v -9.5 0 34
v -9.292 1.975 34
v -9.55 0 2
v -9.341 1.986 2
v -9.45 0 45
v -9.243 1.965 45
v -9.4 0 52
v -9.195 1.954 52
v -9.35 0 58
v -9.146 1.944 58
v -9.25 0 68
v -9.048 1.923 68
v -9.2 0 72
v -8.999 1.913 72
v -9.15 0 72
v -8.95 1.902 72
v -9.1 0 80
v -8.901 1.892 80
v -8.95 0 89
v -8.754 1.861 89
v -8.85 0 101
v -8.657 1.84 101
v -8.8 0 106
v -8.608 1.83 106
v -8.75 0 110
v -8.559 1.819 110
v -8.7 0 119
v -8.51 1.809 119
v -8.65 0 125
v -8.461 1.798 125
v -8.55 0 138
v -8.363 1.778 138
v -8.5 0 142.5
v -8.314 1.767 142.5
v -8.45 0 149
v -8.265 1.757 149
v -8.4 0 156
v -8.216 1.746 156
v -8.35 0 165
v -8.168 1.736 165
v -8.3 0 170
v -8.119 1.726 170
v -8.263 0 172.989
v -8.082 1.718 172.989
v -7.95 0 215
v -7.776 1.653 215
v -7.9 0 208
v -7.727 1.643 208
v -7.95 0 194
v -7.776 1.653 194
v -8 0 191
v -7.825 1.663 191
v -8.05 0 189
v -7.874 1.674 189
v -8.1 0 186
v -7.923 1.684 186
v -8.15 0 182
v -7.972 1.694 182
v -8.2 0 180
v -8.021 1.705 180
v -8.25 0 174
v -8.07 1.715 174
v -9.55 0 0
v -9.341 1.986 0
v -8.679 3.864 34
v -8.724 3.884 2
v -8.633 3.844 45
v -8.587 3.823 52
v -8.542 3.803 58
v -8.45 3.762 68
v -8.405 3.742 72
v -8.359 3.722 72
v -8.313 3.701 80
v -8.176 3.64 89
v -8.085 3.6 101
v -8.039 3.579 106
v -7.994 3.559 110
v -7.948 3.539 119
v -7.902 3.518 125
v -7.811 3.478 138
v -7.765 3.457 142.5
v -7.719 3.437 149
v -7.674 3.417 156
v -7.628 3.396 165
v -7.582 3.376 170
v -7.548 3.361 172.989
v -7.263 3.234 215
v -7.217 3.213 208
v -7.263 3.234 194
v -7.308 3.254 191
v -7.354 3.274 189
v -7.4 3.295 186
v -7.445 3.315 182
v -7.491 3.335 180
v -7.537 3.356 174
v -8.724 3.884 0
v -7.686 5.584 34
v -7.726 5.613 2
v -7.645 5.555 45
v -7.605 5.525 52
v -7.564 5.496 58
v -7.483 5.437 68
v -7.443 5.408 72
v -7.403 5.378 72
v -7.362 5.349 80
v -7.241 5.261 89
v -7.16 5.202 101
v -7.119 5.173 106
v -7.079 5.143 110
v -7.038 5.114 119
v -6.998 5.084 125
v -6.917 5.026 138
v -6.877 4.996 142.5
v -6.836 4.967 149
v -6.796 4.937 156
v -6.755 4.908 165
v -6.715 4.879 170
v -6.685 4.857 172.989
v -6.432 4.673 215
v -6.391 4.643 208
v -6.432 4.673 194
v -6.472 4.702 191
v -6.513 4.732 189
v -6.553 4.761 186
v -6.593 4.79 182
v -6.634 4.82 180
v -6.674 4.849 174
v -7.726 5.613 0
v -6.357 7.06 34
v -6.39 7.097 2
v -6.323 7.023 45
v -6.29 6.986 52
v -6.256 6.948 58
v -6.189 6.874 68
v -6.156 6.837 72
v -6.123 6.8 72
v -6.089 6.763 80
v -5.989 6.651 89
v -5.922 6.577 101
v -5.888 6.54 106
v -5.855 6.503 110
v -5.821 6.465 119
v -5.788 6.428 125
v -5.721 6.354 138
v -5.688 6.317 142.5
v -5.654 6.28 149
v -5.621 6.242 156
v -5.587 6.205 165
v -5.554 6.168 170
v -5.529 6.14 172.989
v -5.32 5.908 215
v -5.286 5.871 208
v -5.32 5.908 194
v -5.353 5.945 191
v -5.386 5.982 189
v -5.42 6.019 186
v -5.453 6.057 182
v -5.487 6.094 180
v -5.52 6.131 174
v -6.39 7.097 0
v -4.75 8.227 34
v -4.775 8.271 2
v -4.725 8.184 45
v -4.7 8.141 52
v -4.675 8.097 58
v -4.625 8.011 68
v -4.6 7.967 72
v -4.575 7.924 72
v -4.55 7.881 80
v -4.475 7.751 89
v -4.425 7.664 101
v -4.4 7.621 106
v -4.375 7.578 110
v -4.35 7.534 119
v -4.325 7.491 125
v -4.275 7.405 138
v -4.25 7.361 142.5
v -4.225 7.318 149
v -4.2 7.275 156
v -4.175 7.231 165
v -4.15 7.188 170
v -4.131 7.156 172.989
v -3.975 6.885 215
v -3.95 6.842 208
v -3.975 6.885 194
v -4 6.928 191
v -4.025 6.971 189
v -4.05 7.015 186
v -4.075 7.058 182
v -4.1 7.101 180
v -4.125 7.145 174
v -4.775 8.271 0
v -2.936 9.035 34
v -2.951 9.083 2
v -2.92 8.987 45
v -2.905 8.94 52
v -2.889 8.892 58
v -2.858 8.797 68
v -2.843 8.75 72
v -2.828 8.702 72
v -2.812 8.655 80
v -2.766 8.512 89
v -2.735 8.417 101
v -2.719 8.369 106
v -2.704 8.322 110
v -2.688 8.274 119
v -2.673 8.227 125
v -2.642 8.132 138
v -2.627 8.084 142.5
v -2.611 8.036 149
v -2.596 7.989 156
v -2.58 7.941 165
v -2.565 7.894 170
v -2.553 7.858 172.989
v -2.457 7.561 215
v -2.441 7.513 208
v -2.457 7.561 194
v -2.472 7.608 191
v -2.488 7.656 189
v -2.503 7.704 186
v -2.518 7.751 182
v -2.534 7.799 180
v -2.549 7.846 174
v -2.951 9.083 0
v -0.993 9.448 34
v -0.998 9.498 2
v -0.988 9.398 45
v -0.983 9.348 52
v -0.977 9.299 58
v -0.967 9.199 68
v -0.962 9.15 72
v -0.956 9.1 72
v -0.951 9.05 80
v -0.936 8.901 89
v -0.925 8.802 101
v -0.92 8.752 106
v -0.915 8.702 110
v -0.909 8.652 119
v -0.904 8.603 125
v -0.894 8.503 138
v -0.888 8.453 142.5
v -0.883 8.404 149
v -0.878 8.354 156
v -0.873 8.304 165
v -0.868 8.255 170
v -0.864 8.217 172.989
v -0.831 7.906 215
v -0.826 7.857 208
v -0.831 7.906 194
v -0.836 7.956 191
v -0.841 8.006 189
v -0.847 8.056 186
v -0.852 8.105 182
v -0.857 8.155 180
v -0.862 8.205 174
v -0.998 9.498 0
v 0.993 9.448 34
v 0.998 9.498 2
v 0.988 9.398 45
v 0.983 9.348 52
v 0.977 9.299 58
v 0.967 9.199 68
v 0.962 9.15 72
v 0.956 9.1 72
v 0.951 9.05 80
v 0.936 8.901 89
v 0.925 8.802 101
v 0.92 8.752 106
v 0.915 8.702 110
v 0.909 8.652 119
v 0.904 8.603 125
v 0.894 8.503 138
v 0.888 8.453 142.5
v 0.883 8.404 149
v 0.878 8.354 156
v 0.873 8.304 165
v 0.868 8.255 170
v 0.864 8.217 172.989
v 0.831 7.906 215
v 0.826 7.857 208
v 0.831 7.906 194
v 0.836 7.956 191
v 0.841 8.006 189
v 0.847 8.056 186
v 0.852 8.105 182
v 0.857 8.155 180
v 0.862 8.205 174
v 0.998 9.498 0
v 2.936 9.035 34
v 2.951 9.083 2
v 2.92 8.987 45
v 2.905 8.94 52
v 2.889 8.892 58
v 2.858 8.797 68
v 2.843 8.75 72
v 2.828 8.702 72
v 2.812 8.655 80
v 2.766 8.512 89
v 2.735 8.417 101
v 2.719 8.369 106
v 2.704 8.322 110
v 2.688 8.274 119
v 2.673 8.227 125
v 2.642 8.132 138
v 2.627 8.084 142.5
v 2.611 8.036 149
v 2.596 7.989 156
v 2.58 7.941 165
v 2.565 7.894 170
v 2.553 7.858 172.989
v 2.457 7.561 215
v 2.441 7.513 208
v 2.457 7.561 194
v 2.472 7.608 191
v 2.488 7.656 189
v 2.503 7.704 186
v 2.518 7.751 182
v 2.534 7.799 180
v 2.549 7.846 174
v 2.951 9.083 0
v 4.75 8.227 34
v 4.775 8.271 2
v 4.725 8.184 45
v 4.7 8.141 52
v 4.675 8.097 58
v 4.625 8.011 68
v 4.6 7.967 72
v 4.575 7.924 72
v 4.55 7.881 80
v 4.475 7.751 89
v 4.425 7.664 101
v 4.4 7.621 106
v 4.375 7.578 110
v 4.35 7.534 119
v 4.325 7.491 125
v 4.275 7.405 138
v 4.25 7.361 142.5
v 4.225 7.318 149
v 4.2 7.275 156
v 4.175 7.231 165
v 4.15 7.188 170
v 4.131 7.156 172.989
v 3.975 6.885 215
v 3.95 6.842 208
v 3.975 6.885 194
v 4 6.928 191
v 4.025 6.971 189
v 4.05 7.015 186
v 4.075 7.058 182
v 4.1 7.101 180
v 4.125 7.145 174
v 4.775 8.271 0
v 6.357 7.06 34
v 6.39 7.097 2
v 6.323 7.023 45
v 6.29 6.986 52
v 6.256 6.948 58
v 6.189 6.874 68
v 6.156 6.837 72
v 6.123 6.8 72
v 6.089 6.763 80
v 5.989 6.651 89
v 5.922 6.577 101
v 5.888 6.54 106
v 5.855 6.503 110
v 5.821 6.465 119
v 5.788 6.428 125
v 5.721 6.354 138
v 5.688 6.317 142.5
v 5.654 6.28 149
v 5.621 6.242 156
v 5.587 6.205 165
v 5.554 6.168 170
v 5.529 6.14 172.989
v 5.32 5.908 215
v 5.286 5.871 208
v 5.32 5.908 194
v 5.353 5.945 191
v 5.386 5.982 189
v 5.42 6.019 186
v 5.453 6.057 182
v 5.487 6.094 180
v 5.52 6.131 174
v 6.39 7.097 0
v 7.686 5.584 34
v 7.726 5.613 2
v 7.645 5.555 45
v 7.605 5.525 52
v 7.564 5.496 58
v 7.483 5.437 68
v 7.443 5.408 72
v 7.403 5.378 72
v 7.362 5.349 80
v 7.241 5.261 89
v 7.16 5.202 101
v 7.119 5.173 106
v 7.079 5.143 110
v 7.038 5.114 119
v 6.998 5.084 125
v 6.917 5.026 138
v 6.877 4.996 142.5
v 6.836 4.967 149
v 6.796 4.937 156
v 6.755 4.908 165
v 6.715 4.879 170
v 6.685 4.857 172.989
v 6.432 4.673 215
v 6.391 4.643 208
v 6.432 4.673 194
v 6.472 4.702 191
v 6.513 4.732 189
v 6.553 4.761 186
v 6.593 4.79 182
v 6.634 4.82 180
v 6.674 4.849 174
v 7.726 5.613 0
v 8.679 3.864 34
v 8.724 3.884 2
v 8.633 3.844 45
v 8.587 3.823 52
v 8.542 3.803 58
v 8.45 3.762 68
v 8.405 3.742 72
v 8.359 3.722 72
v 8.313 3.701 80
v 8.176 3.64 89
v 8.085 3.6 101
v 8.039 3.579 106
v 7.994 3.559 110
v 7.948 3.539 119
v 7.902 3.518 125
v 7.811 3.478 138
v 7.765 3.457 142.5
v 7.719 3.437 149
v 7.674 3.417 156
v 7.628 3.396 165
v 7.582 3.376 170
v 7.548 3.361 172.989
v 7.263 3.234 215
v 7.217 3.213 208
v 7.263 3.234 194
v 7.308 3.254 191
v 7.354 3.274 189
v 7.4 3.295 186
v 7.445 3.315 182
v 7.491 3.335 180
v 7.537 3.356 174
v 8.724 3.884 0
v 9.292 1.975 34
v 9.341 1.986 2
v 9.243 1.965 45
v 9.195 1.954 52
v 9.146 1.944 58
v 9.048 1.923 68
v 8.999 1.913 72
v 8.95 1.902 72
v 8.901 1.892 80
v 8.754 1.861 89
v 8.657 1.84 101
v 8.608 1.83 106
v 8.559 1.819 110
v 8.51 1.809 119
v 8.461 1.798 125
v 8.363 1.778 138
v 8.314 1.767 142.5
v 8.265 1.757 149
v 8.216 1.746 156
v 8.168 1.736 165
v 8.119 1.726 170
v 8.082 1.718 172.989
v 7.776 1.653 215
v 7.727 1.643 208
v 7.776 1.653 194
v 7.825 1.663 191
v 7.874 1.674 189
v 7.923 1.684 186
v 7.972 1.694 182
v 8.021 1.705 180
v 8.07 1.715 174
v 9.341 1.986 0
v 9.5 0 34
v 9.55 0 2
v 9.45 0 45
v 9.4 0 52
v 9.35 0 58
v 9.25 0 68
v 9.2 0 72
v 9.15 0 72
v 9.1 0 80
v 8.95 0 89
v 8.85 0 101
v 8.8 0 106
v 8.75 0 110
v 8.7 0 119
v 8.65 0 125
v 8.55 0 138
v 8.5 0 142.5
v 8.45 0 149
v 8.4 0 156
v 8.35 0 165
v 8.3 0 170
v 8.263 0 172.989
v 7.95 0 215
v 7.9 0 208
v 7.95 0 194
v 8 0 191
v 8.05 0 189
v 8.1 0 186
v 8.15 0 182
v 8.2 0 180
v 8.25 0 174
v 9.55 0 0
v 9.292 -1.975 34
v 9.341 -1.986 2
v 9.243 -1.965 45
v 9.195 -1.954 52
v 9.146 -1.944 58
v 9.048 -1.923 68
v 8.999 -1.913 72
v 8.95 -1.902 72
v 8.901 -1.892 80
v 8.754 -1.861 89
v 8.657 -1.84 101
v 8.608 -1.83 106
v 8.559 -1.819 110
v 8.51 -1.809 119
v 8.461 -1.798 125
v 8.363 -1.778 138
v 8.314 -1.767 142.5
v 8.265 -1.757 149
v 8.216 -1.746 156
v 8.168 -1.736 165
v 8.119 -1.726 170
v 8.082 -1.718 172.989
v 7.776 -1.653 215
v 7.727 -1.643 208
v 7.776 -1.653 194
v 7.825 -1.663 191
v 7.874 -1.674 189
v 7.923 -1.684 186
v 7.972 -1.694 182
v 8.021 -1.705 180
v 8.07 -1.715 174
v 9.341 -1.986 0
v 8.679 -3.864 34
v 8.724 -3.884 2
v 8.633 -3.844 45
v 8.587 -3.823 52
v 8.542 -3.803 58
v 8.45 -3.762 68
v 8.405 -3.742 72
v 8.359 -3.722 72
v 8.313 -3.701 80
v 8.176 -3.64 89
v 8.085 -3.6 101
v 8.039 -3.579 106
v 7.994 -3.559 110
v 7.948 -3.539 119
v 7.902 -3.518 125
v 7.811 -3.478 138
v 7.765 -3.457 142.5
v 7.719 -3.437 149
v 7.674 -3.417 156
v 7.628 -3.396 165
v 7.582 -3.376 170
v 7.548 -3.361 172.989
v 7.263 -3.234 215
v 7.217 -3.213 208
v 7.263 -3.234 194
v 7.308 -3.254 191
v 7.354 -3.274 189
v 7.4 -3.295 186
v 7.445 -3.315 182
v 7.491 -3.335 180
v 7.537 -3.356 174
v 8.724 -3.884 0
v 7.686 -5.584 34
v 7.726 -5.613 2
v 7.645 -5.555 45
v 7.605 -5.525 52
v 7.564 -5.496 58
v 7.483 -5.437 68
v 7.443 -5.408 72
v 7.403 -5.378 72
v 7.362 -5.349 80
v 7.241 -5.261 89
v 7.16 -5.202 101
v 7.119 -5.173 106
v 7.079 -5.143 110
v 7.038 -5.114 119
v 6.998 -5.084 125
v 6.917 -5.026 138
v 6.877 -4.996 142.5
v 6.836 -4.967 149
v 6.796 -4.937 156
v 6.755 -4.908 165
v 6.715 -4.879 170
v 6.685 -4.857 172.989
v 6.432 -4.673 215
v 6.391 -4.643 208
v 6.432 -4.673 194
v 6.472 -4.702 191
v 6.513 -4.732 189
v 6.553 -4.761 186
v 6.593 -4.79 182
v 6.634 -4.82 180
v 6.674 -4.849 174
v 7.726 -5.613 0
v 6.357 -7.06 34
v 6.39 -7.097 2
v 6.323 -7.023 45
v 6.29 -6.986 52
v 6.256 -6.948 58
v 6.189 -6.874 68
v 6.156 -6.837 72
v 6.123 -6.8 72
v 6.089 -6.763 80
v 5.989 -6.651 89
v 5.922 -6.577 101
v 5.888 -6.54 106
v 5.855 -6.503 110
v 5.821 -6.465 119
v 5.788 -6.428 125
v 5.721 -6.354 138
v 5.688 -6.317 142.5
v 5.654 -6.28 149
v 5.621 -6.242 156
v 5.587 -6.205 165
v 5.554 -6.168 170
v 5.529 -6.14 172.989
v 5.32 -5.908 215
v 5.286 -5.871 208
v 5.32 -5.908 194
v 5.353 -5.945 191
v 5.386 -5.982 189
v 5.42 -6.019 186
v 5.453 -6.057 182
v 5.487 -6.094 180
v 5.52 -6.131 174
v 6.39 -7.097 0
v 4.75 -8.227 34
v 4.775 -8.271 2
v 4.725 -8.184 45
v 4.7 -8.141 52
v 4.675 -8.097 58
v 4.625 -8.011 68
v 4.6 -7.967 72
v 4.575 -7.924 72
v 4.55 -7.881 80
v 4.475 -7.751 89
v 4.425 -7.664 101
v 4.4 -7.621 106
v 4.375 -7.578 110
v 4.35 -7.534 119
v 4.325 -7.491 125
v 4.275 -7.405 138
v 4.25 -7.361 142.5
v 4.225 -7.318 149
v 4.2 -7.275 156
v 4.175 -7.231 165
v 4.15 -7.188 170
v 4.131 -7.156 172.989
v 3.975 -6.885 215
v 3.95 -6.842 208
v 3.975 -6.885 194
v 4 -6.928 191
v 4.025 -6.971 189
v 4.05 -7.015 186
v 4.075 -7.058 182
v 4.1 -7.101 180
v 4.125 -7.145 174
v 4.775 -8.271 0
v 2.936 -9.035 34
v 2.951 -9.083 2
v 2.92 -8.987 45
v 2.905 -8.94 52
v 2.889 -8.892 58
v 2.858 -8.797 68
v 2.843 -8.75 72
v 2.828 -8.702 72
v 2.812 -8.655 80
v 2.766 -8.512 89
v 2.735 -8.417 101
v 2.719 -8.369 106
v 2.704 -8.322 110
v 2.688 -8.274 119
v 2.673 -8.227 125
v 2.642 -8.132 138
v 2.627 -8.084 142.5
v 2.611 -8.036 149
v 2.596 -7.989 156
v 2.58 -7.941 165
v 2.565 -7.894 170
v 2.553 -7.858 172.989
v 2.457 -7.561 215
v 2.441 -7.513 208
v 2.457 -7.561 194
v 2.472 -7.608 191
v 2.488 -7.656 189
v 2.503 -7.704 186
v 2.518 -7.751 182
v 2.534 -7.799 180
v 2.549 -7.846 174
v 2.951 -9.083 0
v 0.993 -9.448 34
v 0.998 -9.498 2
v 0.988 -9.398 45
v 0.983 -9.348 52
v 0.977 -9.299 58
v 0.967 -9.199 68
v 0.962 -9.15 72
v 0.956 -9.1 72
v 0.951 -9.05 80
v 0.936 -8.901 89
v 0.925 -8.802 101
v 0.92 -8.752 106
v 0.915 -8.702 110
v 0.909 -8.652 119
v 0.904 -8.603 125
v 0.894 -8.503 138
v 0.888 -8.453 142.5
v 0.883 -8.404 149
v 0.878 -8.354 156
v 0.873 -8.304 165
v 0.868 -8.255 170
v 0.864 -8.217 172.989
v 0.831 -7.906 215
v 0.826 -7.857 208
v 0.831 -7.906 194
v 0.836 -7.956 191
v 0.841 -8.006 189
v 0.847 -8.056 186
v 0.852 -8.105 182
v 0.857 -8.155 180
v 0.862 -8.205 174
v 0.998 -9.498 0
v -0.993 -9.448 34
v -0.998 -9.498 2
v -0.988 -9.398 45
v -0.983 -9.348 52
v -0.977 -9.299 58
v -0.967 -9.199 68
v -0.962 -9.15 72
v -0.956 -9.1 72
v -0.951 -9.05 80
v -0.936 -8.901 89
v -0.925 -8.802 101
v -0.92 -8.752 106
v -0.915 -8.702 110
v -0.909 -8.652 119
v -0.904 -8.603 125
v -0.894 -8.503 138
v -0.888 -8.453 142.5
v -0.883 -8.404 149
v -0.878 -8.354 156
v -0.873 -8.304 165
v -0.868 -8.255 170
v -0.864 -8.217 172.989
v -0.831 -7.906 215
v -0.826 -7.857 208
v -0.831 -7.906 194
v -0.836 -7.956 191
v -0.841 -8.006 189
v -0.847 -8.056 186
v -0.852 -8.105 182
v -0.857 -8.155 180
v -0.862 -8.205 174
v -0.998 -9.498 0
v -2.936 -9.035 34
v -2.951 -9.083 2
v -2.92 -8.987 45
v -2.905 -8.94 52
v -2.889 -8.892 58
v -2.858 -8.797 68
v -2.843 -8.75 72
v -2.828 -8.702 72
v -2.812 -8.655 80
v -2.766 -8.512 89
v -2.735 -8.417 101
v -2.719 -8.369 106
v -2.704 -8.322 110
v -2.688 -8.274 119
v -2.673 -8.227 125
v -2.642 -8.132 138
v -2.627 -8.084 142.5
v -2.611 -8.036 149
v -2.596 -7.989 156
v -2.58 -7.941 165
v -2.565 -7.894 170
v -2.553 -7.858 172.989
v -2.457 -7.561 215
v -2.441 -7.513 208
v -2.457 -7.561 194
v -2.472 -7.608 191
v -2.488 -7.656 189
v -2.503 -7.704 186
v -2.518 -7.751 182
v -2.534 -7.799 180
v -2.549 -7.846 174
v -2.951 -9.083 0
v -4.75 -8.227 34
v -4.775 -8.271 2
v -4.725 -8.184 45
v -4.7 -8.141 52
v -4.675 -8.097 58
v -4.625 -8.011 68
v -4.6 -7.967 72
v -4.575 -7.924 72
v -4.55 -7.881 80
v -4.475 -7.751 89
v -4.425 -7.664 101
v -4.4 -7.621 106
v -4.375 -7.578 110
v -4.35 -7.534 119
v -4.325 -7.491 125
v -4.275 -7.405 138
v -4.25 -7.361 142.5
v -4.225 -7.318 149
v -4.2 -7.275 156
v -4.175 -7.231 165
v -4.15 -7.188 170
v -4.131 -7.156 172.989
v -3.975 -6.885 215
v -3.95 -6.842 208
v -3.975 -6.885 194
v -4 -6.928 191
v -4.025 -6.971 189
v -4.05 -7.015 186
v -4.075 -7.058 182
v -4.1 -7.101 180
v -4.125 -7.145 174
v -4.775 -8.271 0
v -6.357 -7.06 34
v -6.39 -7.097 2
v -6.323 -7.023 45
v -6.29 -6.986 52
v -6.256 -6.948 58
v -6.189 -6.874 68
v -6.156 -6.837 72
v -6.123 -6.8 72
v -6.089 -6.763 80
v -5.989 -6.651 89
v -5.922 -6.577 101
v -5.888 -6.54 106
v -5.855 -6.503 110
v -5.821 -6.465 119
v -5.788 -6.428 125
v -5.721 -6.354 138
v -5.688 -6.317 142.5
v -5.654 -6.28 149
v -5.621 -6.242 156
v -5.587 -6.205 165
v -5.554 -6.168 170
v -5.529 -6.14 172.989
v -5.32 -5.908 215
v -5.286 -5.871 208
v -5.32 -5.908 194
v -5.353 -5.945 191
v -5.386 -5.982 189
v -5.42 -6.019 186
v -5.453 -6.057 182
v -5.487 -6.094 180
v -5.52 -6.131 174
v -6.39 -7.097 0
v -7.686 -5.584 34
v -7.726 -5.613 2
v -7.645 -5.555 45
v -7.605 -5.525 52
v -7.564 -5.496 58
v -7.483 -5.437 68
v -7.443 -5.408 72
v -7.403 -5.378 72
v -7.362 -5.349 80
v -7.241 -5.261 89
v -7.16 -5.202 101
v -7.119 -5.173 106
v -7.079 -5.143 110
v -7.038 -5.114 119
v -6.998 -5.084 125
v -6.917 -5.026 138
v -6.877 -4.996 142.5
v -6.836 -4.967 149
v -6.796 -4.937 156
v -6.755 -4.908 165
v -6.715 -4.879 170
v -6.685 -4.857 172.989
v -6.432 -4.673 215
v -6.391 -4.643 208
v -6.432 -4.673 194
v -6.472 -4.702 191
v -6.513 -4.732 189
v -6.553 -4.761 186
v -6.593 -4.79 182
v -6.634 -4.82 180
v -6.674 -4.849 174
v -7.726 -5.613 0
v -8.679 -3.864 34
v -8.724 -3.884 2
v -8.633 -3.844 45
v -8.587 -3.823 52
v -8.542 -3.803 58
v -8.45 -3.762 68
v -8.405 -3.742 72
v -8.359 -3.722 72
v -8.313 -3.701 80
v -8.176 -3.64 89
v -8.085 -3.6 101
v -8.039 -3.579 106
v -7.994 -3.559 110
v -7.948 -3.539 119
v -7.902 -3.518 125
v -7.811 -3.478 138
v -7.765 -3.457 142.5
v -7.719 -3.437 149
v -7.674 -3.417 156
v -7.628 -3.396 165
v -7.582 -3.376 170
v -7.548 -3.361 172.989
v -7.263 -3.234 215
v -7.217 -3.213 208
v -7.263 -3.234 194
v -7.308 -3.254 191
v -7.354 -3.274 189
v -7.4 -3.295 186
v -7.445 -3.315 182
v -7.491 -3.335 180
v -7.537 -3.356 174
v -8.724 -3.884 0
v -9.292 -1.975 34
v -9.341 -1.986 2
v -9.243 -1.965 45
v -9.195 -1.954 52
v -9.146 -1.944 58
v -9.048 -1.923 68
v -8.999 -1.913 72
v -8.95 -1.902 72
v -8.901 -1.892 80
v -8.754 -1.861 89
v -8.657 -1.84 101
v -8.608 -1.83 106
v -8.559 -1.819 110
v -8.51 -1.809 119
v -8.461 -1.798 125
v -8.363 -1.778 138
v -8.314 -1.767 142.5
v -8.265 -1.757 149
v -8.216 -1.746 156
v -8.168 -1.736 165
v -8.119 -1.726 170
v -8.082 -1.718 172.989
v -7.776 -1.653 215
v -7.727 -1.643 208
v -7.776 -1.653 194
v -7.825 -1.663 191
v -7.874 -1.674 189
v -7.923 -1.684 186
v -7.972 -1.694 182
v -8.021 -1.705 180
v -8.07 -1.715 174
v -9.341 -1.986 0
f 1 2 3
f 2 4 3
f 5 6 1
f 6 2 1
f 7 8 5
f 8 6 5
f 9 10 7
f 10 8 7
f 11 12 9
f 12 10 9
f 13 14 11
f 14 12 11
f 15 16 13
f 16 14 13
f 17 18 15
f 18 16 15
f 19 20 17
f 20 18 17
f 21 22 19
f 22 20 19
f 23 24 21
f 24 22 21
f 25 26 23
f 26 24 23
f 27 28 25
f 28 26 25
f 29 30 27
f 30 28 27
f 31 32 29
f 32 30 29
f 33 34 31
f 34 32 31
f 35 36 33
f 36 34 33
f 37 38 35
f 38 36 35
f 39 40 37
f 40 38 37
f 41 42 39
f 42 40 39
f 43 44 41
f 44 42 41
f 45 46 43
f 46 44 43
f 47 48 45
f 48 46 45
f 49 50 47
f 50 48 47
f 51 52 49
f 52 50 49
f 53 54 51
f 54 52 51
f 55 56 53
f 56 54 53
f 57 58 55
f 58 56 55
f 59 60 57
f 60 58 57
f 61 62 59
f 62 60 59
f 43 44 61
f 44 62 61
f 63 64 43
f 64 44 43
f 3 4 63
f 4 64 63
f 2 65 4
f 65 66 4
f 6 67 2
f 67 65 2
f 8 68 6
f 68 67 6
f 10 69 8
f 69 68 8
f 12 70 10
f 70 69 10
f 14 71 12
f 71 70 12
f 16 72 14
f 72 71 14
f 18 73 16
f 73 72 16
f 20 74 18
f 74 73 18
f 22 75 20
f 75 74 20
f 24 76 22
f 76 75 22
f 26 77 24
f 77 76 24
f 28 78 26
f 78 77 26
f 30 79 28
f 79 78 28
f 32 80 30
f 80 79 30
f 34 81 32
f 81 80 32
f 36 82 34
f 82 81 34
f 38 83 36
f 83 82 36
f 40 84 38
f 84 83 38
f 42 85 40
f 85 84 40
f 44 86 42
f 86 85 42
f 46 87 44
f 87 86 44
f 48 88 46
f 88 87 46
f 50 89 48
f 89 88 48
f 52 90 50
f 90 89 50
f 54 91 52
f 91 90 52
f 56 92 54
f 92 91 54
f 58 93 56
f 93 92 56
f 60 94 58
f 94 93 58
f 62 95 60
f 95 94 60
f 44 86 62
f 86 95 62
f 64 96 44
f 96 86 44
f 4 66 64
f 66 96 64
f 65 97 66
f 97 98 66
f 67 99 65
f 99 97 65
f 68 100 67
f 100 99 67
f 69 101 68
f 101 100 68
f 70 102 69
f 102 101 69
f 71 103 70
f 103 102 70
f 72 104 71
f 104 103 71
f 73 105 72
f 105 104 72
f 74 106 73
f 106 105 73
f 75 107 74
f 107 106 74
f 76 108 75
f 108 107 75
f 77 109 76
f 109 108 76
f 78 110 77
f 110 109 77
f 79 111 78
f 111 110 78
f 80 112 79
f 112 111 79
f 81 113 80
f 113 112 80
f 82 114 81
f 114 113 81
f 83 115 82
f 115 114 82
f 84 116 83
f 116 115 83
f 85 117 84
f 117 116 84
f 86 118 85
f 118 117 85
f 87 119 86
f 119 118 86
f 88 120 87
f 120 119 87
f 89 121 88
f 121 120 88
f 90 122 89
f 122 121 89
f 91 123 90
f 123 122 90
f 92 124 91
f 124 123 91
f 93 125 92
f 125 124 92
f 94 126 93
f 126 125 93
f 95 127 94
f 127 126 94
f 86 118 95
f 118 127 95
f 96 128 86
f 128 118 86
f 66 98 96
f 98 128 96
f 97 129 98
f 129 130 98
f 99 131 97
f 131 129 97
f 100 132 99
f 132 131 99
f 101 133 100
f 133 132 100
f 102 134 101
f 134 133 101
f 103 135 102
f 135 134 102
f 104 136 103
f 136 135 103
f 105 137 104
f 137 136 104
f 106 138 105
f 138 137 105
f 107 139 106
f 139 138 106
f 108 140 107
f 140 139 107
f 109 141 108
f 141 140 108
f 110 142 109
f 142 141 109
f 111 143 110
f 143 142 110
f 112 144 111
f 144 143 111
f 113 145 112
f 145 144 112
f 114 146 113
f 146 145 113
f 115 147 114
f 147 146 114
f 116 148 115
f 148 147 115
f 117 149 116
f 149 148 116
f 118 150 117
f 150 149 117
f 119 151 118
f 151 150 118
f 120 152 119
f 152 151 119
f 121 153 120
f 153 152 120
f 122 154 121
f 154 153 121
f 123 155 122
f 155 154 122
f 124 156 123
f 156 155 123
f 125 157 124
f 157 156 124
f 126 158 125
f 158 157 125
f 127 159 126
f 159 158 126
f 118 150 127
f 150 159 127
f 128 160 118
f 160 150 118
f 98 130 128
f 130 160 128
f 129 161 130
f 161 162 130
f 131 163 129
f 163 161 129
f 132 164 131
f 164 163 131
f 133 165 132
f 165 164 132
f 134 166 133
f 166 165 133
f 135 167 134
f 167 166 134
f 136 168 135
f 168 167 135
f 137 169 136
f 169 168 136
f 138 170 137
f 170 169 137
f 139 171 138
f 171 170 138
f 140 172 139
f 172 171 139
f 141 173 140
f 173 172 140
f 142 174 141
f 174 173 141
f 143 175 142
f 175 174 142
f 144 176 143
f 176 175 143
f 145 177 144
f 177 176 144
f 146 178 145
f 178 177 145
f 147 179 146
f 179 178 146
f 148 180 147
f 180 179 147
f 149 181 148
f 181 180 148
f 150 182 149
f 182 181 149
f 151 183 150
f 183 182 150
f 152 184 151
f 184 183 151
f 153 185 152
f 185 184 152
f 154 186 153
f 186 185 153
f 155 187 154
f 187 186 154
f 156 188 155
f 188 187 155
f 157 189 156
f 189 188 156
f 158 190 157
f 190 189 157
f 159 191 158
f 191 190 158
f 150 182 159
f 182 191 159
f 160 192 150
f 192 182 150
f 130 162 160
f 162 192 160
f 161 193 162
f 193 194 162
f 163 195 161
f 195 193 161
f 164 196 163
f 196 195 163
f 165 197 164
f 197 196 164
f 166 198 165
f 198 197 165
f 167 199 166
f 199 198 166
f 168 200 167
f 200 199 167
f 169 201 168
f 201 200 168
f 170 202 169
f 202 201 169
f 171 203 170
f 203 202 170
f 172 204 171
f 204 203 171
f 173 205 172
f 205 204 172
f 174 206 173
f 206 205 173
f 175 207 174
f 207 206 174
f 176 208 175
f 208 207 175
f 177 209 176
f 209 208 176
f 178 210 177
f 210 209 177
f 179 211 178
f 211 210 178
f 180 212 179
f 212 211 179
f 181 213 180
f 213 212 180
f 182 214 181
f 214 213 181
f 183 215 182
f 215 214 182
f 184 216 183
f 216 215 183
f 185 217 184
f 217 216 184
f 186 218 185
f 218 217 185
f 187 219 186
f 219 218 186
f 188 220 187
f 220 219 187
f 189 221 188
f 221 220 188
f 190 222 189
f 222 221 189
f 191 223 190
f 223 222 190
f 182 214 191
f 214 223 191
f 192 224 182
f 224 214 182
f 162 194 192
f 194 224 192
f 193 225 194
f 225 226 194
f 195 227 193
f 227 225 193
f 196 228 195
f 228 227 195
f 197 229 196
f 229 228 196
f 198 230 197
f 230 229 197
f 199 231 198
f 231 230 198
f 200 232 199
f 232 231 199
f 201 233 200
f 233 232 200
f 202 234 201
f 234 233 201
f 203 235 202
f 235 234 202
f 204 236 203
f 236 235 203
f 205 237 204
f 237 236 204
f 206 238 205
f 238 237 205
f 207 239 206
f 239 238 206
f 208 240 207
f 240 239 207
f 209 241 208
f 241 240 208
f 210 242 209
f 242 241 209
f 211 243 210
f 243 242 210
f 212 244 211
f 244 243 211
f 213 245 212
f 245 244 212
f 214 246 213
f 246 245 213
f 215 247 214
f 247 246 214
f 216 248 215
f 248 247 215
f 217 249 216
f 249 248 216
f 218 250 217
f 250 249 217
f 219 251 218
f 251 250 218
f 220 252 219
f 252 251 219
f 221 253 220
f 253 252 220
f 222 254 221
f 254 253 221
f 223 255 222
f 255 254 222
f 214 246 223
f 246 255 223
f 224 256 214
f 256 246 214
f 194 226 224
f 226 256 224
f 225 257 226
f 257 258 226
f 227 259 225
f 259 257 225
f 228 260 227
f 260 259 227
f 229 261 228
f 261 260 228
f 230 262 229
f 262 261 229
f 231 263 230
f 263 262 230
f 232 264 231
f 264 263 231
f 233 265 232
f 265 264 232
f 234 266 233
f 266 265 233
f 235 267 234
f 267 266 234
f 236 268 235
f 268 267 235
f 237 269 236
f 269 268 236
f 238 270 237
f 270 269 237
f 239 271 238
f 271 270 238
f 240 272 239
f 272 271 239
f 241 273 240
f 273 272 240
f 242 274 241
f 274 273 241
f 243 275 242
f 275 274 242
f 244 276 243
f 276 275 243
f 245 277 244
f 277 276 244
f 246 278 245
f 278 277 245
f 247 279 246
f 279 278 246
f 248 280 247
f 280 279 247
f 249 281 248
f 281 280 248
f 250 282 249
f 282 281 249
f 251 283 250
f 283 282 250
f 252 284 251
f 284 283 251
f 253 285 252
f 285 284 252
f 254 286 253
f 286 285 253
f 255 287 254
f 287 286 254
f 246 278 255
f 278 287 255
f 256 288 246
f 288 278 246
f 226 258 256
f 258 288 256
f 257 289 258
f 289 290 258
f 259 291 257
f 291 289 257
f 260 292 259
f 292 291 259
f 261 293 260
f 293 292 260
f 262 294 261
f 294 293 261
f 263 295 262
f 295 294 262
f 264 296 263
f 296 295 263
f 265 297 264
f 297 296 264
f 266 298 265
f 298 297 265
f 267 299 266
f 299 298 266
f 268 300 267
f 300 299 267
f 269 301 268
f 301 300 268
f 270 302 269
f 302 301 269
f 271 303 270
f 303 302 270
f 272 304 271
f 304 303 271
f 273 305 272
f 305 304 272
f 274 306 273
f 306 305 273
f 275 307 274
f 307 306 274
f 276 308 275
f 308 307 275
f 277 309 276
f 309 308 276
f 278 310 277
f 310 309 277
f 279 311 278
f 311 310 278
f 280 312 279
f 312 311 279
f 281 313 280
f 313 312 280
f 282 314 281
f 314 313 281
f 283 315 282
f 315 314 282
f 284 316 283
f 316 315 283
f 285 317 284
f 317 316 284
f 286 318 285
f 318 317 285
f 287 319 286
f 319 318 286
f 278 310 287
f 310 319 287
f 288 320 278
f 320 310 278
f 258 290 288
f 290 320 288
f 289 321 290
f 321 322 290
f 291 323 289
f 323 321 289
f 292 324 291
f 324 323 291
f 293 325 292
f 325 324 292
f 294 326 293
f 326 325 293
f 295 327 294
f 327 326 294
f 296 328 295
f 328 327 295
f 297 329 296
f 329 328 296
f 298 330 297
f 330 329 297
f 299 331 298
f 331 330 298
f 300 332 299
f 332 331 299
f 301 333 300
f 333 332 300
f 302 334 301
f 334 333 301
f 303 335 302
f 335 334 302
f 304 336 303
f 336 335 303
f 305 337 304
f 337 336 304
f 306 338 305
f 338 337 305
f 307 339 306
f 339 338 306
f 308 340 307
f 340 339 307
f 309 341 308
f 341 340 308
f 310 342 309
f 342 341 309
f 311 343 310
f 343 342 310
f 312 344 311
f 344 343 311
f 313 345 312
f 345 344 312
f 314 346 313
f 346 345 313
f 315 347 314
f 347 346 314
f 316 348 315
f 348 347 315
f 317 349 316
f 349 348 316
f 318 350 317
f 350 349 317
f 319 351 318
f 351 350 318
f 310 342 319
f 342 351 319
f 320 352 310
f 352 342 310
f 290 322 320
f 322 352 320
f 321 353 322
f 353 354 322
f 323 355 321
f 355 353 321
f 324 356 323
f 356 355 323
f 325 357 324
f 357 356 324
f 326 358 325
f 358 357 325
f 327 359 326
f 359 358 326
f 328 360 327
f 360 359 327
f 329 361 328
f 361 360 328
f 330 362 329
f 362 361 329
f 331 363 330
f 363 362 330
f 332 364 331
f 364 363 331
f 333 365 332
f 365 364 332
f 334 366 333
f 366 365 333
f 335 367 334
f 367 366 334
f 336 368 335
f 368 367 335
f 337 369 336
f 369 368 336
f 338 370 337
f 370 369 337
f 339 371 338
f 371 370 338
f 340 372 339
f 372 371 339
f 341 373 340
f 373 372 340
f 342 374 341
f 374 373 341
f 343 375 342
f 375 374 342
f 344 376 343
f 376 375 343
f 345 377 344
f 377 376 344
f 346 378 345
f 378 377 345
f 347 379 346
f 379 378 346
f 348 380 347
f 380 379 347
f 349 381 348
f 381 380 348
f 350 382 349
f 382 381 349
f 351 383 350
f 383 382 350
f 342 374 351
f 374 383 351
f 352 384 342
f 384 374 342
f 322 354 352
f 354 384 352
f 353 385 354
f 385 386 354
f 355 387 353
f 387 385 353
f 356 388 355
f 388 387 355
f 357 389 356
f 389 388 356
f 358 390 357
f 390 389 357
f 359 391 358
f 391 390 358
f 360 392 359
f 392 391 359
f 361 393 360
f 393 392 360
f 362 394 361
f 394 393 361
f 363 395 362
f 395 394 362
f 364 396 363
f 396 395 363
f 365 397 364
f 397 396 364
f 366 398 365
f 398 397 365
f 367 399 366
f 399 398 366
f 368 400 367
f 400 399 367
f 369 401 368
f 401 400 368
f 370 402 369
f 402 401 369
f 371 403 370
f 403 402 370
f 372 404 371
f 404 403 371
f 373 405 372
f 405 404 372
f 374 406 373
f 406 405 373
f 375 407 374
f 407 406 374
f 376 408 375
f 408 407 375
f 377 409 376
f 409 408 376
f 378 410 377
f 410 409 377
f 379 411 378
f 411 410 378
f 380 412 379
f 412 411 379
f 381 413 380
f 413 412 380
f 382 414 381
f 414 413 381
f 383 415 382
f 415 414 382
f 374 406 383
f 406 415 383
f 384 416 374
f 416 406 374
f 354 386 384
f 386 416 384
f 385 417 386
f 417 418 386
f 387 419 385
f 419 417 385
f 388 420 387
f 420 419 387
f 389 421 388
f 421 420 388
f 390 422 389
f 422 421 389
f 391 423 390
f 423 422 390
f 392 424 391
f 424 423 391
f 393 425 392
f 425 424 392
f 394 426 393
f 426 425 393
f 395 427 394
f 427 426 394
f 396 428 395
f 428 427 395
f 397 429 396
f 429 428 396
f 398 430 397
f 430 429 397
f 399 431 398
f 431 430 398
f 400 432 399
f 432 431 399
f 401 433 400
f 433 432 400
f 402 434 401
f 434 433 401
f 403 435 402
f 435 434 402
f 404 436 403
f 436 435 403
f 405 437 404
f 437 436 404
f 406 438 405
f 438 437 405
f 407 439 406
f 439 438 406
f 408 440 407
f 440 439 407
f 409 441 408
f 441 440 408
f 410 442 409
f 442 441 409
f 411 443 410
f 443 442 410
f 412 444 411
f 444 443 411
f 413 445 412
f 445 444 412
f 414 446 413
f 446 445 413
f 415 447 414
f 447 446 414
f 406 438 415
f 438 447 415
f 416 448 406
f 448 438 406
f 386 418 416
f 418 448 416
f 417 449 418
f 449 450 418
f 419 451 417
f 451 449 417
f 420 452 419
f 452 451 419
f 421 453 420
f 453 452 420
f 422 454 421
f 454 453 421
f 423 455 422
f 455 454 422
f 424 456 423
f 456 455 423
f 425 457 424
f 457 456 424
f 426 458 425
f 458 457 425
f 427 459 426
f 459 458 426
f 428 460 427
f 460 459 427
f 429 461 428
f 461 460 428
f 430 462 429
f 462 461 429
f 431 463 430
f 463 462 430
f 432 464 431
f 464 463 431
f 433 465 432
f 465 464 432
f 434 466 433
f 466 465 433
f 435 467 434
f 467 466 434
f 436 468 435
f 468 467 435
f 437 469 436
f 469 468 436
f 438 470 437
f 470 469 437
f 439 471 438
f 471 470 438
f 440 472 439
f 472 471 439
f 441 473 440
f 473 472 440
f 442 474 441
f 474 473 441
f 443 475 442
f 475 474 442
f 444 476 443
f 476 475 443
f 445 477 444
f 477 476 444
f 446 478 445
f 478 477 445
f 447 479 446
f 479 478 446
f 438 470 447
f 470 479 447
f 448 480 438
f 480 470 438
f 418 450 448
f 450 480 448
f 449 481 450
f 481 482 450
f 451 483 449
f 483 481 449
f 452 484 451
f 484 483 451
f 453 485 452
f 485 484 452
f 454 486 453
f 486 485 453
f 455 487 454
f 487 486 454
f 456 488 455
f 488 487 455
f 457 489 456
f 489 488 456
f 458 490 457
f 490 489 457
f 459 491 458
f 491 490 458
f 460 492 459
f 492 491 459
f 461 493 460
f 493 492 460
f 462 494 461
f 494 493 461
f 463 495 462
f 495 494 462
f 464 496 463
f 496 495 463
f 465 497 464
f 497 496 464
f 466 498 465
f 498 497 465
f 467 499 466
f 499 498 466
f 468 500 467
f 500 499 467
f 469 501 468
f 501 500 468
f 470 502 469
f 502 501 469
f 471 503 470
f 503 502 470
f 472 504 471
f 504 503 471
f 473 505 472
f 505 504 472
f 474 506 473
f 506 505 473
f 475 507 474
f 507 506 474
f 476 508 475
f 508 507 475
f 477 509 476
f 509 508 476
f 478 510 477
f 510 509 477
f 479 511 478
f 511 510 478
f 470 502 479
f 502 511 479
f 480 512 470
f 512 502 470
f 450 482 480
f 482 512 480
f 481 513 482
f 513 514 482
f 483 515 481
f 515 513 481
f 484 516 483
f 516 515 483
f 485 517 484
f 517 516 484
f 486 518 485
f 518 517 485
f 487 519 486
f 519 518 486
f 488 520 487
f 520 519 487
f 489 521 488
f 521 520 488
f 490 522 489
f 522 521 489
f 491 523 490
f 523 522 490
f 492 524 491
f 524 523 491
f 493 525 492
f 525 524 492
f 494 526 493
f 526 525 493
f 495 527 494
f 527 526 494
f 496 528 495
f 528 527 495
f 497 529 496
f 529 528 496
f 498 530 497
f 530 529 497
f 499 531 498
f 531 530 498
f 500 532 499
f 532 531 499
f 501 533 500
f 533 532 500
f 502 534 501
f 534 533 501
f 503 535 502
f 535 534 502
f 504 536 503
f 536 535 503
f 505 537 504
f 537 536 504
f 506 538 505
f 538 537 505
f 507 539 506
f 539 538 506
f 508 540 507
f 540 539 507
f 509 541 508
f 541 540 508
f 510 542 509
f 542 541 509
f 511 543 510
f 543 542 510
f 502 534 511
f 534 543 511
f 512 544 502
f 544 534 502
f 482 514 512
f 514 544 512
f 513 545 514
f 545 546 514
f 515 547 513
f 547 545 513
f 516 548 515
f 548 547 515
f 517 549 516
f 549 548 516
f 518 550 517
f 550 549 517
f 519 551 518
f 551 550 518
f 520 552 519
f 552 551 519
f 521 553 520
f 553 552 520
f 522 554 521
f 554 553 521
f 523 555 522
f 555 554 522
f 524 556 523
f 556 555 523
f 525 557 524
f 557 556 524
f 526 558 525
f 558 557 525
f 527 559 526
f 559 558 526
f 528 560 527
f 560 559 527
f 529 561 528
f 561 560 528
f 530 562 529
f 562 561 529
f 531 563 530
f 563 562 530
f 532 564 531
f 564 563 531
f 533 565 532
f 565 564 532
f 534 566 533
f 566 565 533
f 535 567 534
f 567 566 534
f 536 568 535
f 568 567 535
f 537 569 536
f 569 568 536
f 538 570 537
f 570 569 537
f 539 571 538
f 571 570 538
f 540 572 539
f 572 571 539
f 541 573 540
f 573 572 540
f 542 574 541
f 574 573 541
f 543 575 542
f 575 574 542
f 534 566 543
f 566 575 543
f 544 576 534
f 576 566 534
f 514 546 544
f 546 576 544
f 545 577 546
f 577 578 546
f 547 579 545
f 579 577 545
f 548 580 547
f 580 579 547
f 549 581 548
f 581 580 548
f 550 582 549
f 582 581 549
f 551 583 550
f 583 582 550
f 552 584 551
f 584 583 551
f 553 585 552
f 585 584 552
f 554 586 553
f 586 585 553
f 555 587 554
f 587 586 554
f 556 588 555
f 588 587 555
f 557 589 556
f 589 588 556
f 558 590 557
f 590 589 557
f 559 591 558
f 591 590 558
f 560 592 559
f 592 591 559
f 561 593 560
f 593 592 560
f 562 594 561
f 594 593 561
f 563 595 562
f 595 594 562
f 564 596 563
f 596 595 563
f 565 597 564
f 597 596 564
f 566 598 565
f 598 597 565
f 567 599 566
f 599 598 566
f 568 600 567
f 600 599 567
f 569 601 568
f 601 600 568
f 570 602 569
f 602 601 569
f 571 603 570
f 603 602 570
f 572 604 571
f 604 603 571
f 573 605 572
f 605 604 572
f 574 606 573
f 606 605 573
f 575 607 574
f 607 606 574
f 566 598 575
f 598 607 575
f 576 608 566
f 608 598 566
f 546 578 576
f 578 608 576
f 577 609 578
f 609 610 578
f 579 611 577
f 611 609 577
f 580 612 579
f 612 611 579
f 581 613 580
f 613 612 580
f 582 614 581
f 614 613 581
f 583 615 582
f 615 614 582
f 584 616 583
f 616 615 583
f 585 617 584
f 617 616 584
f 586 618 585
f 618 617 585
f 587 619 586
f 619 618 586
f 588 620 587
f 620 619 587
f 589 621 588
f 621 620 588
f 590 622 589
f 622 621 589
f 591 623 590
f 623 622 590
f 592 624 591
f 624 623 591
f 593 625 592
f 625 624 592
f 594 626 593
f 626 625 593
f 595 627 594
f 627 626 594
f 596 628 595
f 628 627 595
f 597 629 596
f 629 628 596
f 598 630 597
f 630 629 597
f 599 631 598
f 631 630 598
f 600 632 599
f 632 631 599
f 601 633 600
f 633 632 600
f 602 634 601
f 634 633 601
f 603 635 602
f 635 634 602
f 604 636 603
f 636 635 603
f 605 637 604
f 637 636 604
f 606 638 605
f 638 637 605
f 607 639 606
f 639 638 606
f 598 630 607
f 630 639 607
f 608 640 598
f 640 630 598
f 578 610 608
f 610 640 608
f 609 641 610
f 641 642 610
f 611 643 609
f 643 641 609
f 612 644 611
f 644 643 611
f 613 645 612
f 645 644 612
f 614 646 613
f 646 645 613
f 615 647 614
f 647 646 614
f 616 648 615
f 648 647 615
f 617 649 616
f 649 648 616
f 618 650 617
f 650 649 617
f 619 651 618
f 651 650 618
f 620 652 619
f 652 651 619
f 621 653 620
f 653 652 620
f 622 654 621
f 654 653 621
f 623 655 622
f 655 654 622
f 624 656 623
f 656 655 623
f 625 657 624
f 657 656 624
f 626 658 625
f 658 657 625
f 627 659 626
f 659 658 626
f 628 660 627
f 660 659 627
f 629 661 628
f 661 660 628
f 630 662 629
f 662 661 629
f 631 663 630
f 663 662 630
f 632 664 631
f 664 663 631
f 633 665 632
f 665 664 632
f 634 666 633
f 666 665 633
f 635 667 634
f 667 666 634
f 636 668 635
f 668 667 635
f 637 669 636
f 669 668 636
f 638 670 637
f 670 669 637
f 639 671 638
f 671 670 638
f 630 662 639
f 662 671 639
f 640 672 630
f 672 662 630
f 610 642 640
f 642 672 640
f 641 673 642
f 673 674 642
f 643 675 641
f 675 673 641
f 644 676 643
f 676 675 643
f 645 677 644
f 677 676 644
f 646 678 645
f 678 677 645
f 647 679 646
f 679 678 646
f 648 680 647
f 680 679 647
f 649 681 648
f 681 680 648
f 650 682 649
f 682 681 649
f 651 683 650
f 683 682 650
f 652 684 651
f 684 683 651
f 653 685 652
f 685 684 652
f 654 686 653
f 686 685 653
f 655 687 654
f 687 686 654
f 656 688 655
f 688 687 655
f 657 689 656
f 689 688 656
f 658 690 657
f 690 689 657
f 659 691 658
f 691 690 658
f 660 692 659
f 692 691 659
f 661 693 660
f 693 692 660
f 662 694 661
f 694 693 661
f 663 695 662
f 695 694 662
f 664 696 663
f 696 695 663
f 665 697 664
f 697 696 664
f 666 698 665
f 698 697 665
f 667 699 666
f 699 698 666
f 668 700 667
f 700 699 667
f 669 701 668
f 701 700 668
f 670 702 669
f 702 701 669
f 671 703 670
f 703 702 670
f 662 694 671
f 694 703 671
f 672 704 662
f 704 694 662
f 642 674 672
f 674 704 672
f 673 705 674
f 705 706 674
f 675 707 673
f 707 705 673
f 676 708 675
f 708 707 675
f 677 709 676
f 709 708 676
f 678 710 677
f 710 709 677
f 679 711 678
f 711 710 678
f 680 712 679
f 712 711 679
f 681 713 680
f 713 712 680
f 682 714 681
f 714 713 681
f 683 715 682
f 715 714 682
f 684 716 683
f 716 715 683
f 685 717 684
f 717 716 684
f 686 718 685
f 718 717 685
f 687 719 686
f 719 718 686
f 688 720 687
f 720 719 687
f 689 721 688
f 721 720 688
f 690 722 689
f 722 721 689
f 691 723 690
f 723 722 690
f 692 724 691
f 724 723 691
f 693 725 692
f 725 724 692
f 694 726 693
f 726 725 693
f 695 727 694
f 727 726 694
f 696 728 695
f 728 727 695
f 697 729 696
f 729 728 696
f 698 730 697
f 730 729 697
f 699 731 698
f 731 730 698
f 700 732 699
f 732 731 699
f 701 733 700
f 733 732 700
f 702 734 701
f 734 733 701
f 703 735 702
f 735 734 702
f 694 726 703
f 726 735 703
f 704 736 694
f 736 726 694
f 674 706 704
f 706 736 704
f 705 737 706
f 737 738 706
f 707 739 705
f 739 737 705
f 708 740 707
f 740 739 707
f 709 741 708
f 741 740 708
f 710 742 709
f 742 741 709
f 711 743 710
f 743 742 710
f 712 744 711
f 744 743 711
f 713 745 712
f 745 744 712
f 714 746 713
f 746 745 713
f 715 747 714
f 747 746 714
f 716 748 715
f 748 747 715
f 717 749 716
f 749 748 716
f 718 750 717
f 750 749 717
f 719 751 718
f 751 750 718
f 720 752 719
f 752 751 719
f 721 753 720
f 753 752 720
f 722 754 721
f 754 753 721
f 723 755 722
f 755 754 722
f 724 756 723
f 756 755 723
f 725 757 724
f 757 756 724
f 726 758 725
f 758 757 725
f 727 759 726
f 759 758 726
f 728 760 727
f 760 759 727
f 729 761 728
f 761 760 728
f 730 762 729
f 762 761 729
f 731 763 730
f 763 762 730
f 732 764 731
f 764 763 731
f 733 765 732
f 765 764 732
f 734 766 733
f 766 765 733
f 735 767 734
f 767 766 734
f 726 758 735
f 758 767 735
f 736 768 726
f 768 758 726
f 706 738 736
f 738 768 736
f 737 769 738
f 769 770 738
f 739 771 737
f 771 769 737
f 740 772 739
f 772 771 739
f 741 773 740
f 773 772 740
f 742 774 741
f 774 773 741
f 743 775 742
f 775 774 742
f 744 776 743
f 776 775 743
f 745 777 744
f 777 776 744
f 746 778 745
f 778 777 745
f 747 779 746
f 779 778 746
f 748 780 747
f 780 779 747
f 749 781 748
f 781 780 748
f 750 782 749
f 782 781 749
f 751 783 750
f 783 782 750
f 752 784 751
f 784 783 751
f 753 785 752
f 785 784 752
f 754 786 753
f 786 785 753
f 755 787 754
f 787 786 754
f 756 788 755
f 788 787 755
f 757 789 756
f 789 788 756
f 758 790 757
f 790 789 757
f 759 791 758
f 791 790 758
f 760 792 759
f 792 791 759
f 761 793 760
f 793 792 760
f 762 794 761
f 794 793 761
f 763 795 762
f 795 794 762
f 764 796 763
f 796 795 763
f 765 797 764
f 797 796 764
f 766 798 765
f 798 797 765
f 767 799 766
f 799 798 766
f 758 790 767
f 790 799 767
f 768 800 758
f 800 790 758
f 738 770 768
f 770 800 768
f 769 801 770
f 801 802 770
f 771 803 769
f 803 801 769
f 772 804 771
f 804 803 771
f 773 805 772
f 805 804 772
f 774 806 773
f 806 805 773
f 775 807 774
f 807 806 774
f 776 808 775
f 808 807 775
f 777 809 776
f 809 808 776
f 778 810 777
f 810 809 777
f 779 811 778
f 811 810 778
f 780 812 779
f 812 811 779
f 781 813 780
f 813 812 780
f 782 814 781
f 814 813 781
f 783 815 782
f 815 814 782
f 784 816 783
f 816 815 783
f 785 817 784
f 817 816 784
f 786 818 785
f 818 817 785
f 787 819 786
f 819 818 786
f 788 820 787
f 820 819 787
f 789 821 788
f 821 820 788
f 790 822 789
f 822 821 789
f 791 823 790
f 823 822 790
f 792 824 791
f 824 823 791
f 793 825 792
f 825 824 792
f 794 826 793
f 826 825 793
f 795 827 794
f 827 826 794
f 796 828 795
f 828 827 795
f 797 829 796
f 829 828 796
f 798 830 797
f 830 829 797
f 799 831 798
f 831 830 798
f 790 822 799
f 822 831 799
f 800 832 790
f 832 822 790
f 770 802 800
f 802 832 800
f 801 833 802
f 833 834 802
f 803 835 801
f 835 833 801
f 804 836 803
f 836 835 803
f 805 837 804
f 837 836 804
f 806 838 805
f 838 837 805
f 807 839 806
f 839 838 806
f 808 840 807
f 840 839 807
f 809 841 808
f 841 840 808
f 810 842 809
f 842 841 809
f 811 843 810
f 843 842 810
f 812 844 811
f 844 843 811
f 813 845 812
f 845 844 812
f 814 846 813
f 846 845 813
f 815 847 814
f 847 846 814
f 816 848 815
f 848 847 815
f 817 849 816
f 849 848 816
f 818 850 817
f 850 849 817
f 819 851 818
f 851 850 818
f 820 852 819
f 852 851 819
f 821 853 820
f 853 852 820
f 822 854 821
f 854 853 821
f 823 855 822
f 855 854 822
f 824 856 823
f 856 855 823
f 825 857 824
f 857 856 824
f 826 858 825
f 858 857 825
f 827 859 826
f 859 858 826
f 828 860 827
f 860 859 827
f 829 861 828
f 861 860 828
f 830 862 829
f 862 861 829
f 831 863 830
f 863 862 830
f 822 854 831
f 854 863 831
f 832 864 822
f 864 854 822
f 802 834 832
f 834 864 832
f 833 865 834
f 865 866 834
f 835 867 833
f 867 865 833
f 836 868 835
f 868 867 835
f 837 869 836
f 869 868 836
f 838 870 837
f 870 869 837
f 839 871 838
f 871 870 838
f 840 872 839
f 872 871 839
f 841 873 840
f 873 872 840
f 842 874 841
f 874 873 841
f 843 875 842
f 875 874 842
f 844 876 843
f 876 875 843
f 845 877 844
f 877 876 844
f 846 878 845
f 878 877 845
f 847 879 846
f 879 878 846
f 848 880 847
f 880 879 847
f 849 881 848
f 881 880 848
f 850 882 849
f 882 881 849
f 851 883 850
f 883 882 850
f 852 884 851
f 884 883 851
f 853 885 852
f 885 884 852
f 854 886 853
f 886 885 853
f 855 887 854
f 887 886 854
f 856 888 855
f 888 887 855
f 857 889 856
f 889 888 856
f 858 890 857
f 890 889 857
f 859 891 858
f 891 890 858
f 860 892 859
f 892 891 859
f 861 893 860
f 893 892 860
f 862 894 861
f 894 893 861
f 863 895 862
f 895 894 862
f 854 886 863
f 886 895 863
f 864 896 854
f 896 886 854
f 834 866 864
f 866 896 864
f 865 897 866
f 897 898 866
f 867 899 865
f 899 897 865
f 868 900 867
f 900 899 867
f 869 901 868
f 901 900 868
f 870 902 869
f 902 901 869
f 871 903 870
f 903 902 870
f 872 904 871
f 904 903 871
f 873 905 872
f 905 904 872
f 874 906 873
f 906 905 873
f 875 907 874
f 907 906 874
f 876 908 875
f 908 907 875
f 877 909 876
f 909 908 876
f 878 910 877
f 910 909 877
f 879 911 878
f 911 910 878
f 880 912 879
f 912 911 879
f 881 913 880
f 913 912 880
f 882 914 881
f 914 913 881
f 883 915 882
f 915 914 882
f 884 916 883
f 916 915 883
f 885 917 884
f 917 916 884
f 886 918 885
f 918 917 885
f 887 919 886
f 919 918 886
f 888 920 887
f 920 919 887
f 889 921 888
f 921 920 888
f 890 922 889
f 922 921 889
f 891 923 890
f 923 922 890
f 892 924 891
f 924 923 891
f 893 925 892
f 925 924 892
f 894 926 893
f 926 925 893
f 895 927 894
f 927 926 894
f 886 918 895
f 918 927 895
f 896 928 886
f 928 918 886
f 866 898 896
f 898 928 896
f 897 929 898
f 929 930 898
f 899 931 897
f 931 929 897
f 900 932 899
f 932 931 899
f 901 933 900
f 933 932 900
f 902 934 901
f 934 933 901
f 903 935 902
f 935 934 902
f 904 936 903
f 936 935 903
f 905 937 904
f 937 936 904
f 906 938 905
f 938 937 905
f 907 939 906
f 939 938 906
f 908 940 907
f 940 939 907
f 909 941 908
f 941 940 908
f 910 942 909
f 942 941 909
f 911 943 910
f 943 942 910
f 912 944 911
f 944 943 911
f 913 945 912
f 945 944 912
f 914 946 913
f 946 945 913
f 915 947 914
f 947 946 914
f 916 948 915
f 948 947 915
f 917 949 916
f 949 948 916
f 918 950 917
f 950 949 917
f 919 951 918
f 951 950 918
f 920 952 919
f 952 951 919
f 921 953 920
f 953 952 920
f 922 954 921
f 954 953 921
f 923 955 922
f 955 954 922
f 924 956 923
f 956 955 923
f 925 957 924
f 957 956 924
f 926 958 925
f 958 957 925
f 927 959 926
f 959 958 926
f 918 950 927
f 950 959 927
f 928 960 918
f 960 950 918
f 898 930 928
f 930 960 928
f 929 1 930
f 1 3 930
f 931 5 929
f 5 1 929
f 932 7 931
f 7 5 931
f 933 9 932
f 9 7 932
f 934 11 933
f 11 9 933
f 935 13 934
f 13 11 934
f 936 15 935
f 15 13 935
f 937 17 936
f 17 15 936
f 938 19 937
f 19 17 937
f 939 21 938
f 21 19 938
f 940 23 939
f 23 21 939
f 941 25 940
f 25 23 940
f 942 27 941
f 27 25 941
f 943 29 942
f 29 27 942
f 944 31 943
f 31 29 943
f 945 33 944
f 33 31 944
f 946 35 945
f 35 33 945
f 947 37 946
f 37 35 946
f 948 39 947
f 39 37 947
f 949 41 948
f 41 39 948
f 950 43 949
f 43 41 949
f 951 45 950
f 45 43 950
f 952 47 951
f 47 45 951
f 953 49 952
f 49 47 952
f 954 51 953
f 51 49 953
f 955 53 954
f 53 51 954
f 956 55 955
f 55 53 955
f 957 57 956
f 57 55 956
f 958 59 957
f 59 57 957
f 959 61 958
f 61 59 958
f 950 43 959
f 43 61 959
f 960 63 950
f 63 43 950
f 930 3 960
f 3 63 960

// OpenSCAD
rotate_extrude () {
  polygon (points=[[9.55, 0.0], [9.55, 2.0], [9.5, 34.0], [9.45, 45.0], [9.4, 52.0], [9.35, 58.0], [9.3, 63.0], [9.25, 68.0], [9.2, 72.0], [9.15, 72.0], [9.1, 80.0], [9.05, 83.0], [9.0, 86.0], [8.95, 89.0], [8.85, 101.0], [8.8, 106.0], [8.75, 110.0], [8.7, 119.0], [8.65, 125.0], [8.55, 138.0], [8.5, 142.5], [8.45, 149.0], [8.4, 156.0], [8.35, 165.0], [8.3, 170.0], [8.25, 174.0], [8.2, 180.0], [8.15, 182.0], [8.1, 186.0], [8.05, 189.0], [8.0, 191.0], [7.95, 194.0], [7.9, 208.0], [7.95, 215.0]]);
}
